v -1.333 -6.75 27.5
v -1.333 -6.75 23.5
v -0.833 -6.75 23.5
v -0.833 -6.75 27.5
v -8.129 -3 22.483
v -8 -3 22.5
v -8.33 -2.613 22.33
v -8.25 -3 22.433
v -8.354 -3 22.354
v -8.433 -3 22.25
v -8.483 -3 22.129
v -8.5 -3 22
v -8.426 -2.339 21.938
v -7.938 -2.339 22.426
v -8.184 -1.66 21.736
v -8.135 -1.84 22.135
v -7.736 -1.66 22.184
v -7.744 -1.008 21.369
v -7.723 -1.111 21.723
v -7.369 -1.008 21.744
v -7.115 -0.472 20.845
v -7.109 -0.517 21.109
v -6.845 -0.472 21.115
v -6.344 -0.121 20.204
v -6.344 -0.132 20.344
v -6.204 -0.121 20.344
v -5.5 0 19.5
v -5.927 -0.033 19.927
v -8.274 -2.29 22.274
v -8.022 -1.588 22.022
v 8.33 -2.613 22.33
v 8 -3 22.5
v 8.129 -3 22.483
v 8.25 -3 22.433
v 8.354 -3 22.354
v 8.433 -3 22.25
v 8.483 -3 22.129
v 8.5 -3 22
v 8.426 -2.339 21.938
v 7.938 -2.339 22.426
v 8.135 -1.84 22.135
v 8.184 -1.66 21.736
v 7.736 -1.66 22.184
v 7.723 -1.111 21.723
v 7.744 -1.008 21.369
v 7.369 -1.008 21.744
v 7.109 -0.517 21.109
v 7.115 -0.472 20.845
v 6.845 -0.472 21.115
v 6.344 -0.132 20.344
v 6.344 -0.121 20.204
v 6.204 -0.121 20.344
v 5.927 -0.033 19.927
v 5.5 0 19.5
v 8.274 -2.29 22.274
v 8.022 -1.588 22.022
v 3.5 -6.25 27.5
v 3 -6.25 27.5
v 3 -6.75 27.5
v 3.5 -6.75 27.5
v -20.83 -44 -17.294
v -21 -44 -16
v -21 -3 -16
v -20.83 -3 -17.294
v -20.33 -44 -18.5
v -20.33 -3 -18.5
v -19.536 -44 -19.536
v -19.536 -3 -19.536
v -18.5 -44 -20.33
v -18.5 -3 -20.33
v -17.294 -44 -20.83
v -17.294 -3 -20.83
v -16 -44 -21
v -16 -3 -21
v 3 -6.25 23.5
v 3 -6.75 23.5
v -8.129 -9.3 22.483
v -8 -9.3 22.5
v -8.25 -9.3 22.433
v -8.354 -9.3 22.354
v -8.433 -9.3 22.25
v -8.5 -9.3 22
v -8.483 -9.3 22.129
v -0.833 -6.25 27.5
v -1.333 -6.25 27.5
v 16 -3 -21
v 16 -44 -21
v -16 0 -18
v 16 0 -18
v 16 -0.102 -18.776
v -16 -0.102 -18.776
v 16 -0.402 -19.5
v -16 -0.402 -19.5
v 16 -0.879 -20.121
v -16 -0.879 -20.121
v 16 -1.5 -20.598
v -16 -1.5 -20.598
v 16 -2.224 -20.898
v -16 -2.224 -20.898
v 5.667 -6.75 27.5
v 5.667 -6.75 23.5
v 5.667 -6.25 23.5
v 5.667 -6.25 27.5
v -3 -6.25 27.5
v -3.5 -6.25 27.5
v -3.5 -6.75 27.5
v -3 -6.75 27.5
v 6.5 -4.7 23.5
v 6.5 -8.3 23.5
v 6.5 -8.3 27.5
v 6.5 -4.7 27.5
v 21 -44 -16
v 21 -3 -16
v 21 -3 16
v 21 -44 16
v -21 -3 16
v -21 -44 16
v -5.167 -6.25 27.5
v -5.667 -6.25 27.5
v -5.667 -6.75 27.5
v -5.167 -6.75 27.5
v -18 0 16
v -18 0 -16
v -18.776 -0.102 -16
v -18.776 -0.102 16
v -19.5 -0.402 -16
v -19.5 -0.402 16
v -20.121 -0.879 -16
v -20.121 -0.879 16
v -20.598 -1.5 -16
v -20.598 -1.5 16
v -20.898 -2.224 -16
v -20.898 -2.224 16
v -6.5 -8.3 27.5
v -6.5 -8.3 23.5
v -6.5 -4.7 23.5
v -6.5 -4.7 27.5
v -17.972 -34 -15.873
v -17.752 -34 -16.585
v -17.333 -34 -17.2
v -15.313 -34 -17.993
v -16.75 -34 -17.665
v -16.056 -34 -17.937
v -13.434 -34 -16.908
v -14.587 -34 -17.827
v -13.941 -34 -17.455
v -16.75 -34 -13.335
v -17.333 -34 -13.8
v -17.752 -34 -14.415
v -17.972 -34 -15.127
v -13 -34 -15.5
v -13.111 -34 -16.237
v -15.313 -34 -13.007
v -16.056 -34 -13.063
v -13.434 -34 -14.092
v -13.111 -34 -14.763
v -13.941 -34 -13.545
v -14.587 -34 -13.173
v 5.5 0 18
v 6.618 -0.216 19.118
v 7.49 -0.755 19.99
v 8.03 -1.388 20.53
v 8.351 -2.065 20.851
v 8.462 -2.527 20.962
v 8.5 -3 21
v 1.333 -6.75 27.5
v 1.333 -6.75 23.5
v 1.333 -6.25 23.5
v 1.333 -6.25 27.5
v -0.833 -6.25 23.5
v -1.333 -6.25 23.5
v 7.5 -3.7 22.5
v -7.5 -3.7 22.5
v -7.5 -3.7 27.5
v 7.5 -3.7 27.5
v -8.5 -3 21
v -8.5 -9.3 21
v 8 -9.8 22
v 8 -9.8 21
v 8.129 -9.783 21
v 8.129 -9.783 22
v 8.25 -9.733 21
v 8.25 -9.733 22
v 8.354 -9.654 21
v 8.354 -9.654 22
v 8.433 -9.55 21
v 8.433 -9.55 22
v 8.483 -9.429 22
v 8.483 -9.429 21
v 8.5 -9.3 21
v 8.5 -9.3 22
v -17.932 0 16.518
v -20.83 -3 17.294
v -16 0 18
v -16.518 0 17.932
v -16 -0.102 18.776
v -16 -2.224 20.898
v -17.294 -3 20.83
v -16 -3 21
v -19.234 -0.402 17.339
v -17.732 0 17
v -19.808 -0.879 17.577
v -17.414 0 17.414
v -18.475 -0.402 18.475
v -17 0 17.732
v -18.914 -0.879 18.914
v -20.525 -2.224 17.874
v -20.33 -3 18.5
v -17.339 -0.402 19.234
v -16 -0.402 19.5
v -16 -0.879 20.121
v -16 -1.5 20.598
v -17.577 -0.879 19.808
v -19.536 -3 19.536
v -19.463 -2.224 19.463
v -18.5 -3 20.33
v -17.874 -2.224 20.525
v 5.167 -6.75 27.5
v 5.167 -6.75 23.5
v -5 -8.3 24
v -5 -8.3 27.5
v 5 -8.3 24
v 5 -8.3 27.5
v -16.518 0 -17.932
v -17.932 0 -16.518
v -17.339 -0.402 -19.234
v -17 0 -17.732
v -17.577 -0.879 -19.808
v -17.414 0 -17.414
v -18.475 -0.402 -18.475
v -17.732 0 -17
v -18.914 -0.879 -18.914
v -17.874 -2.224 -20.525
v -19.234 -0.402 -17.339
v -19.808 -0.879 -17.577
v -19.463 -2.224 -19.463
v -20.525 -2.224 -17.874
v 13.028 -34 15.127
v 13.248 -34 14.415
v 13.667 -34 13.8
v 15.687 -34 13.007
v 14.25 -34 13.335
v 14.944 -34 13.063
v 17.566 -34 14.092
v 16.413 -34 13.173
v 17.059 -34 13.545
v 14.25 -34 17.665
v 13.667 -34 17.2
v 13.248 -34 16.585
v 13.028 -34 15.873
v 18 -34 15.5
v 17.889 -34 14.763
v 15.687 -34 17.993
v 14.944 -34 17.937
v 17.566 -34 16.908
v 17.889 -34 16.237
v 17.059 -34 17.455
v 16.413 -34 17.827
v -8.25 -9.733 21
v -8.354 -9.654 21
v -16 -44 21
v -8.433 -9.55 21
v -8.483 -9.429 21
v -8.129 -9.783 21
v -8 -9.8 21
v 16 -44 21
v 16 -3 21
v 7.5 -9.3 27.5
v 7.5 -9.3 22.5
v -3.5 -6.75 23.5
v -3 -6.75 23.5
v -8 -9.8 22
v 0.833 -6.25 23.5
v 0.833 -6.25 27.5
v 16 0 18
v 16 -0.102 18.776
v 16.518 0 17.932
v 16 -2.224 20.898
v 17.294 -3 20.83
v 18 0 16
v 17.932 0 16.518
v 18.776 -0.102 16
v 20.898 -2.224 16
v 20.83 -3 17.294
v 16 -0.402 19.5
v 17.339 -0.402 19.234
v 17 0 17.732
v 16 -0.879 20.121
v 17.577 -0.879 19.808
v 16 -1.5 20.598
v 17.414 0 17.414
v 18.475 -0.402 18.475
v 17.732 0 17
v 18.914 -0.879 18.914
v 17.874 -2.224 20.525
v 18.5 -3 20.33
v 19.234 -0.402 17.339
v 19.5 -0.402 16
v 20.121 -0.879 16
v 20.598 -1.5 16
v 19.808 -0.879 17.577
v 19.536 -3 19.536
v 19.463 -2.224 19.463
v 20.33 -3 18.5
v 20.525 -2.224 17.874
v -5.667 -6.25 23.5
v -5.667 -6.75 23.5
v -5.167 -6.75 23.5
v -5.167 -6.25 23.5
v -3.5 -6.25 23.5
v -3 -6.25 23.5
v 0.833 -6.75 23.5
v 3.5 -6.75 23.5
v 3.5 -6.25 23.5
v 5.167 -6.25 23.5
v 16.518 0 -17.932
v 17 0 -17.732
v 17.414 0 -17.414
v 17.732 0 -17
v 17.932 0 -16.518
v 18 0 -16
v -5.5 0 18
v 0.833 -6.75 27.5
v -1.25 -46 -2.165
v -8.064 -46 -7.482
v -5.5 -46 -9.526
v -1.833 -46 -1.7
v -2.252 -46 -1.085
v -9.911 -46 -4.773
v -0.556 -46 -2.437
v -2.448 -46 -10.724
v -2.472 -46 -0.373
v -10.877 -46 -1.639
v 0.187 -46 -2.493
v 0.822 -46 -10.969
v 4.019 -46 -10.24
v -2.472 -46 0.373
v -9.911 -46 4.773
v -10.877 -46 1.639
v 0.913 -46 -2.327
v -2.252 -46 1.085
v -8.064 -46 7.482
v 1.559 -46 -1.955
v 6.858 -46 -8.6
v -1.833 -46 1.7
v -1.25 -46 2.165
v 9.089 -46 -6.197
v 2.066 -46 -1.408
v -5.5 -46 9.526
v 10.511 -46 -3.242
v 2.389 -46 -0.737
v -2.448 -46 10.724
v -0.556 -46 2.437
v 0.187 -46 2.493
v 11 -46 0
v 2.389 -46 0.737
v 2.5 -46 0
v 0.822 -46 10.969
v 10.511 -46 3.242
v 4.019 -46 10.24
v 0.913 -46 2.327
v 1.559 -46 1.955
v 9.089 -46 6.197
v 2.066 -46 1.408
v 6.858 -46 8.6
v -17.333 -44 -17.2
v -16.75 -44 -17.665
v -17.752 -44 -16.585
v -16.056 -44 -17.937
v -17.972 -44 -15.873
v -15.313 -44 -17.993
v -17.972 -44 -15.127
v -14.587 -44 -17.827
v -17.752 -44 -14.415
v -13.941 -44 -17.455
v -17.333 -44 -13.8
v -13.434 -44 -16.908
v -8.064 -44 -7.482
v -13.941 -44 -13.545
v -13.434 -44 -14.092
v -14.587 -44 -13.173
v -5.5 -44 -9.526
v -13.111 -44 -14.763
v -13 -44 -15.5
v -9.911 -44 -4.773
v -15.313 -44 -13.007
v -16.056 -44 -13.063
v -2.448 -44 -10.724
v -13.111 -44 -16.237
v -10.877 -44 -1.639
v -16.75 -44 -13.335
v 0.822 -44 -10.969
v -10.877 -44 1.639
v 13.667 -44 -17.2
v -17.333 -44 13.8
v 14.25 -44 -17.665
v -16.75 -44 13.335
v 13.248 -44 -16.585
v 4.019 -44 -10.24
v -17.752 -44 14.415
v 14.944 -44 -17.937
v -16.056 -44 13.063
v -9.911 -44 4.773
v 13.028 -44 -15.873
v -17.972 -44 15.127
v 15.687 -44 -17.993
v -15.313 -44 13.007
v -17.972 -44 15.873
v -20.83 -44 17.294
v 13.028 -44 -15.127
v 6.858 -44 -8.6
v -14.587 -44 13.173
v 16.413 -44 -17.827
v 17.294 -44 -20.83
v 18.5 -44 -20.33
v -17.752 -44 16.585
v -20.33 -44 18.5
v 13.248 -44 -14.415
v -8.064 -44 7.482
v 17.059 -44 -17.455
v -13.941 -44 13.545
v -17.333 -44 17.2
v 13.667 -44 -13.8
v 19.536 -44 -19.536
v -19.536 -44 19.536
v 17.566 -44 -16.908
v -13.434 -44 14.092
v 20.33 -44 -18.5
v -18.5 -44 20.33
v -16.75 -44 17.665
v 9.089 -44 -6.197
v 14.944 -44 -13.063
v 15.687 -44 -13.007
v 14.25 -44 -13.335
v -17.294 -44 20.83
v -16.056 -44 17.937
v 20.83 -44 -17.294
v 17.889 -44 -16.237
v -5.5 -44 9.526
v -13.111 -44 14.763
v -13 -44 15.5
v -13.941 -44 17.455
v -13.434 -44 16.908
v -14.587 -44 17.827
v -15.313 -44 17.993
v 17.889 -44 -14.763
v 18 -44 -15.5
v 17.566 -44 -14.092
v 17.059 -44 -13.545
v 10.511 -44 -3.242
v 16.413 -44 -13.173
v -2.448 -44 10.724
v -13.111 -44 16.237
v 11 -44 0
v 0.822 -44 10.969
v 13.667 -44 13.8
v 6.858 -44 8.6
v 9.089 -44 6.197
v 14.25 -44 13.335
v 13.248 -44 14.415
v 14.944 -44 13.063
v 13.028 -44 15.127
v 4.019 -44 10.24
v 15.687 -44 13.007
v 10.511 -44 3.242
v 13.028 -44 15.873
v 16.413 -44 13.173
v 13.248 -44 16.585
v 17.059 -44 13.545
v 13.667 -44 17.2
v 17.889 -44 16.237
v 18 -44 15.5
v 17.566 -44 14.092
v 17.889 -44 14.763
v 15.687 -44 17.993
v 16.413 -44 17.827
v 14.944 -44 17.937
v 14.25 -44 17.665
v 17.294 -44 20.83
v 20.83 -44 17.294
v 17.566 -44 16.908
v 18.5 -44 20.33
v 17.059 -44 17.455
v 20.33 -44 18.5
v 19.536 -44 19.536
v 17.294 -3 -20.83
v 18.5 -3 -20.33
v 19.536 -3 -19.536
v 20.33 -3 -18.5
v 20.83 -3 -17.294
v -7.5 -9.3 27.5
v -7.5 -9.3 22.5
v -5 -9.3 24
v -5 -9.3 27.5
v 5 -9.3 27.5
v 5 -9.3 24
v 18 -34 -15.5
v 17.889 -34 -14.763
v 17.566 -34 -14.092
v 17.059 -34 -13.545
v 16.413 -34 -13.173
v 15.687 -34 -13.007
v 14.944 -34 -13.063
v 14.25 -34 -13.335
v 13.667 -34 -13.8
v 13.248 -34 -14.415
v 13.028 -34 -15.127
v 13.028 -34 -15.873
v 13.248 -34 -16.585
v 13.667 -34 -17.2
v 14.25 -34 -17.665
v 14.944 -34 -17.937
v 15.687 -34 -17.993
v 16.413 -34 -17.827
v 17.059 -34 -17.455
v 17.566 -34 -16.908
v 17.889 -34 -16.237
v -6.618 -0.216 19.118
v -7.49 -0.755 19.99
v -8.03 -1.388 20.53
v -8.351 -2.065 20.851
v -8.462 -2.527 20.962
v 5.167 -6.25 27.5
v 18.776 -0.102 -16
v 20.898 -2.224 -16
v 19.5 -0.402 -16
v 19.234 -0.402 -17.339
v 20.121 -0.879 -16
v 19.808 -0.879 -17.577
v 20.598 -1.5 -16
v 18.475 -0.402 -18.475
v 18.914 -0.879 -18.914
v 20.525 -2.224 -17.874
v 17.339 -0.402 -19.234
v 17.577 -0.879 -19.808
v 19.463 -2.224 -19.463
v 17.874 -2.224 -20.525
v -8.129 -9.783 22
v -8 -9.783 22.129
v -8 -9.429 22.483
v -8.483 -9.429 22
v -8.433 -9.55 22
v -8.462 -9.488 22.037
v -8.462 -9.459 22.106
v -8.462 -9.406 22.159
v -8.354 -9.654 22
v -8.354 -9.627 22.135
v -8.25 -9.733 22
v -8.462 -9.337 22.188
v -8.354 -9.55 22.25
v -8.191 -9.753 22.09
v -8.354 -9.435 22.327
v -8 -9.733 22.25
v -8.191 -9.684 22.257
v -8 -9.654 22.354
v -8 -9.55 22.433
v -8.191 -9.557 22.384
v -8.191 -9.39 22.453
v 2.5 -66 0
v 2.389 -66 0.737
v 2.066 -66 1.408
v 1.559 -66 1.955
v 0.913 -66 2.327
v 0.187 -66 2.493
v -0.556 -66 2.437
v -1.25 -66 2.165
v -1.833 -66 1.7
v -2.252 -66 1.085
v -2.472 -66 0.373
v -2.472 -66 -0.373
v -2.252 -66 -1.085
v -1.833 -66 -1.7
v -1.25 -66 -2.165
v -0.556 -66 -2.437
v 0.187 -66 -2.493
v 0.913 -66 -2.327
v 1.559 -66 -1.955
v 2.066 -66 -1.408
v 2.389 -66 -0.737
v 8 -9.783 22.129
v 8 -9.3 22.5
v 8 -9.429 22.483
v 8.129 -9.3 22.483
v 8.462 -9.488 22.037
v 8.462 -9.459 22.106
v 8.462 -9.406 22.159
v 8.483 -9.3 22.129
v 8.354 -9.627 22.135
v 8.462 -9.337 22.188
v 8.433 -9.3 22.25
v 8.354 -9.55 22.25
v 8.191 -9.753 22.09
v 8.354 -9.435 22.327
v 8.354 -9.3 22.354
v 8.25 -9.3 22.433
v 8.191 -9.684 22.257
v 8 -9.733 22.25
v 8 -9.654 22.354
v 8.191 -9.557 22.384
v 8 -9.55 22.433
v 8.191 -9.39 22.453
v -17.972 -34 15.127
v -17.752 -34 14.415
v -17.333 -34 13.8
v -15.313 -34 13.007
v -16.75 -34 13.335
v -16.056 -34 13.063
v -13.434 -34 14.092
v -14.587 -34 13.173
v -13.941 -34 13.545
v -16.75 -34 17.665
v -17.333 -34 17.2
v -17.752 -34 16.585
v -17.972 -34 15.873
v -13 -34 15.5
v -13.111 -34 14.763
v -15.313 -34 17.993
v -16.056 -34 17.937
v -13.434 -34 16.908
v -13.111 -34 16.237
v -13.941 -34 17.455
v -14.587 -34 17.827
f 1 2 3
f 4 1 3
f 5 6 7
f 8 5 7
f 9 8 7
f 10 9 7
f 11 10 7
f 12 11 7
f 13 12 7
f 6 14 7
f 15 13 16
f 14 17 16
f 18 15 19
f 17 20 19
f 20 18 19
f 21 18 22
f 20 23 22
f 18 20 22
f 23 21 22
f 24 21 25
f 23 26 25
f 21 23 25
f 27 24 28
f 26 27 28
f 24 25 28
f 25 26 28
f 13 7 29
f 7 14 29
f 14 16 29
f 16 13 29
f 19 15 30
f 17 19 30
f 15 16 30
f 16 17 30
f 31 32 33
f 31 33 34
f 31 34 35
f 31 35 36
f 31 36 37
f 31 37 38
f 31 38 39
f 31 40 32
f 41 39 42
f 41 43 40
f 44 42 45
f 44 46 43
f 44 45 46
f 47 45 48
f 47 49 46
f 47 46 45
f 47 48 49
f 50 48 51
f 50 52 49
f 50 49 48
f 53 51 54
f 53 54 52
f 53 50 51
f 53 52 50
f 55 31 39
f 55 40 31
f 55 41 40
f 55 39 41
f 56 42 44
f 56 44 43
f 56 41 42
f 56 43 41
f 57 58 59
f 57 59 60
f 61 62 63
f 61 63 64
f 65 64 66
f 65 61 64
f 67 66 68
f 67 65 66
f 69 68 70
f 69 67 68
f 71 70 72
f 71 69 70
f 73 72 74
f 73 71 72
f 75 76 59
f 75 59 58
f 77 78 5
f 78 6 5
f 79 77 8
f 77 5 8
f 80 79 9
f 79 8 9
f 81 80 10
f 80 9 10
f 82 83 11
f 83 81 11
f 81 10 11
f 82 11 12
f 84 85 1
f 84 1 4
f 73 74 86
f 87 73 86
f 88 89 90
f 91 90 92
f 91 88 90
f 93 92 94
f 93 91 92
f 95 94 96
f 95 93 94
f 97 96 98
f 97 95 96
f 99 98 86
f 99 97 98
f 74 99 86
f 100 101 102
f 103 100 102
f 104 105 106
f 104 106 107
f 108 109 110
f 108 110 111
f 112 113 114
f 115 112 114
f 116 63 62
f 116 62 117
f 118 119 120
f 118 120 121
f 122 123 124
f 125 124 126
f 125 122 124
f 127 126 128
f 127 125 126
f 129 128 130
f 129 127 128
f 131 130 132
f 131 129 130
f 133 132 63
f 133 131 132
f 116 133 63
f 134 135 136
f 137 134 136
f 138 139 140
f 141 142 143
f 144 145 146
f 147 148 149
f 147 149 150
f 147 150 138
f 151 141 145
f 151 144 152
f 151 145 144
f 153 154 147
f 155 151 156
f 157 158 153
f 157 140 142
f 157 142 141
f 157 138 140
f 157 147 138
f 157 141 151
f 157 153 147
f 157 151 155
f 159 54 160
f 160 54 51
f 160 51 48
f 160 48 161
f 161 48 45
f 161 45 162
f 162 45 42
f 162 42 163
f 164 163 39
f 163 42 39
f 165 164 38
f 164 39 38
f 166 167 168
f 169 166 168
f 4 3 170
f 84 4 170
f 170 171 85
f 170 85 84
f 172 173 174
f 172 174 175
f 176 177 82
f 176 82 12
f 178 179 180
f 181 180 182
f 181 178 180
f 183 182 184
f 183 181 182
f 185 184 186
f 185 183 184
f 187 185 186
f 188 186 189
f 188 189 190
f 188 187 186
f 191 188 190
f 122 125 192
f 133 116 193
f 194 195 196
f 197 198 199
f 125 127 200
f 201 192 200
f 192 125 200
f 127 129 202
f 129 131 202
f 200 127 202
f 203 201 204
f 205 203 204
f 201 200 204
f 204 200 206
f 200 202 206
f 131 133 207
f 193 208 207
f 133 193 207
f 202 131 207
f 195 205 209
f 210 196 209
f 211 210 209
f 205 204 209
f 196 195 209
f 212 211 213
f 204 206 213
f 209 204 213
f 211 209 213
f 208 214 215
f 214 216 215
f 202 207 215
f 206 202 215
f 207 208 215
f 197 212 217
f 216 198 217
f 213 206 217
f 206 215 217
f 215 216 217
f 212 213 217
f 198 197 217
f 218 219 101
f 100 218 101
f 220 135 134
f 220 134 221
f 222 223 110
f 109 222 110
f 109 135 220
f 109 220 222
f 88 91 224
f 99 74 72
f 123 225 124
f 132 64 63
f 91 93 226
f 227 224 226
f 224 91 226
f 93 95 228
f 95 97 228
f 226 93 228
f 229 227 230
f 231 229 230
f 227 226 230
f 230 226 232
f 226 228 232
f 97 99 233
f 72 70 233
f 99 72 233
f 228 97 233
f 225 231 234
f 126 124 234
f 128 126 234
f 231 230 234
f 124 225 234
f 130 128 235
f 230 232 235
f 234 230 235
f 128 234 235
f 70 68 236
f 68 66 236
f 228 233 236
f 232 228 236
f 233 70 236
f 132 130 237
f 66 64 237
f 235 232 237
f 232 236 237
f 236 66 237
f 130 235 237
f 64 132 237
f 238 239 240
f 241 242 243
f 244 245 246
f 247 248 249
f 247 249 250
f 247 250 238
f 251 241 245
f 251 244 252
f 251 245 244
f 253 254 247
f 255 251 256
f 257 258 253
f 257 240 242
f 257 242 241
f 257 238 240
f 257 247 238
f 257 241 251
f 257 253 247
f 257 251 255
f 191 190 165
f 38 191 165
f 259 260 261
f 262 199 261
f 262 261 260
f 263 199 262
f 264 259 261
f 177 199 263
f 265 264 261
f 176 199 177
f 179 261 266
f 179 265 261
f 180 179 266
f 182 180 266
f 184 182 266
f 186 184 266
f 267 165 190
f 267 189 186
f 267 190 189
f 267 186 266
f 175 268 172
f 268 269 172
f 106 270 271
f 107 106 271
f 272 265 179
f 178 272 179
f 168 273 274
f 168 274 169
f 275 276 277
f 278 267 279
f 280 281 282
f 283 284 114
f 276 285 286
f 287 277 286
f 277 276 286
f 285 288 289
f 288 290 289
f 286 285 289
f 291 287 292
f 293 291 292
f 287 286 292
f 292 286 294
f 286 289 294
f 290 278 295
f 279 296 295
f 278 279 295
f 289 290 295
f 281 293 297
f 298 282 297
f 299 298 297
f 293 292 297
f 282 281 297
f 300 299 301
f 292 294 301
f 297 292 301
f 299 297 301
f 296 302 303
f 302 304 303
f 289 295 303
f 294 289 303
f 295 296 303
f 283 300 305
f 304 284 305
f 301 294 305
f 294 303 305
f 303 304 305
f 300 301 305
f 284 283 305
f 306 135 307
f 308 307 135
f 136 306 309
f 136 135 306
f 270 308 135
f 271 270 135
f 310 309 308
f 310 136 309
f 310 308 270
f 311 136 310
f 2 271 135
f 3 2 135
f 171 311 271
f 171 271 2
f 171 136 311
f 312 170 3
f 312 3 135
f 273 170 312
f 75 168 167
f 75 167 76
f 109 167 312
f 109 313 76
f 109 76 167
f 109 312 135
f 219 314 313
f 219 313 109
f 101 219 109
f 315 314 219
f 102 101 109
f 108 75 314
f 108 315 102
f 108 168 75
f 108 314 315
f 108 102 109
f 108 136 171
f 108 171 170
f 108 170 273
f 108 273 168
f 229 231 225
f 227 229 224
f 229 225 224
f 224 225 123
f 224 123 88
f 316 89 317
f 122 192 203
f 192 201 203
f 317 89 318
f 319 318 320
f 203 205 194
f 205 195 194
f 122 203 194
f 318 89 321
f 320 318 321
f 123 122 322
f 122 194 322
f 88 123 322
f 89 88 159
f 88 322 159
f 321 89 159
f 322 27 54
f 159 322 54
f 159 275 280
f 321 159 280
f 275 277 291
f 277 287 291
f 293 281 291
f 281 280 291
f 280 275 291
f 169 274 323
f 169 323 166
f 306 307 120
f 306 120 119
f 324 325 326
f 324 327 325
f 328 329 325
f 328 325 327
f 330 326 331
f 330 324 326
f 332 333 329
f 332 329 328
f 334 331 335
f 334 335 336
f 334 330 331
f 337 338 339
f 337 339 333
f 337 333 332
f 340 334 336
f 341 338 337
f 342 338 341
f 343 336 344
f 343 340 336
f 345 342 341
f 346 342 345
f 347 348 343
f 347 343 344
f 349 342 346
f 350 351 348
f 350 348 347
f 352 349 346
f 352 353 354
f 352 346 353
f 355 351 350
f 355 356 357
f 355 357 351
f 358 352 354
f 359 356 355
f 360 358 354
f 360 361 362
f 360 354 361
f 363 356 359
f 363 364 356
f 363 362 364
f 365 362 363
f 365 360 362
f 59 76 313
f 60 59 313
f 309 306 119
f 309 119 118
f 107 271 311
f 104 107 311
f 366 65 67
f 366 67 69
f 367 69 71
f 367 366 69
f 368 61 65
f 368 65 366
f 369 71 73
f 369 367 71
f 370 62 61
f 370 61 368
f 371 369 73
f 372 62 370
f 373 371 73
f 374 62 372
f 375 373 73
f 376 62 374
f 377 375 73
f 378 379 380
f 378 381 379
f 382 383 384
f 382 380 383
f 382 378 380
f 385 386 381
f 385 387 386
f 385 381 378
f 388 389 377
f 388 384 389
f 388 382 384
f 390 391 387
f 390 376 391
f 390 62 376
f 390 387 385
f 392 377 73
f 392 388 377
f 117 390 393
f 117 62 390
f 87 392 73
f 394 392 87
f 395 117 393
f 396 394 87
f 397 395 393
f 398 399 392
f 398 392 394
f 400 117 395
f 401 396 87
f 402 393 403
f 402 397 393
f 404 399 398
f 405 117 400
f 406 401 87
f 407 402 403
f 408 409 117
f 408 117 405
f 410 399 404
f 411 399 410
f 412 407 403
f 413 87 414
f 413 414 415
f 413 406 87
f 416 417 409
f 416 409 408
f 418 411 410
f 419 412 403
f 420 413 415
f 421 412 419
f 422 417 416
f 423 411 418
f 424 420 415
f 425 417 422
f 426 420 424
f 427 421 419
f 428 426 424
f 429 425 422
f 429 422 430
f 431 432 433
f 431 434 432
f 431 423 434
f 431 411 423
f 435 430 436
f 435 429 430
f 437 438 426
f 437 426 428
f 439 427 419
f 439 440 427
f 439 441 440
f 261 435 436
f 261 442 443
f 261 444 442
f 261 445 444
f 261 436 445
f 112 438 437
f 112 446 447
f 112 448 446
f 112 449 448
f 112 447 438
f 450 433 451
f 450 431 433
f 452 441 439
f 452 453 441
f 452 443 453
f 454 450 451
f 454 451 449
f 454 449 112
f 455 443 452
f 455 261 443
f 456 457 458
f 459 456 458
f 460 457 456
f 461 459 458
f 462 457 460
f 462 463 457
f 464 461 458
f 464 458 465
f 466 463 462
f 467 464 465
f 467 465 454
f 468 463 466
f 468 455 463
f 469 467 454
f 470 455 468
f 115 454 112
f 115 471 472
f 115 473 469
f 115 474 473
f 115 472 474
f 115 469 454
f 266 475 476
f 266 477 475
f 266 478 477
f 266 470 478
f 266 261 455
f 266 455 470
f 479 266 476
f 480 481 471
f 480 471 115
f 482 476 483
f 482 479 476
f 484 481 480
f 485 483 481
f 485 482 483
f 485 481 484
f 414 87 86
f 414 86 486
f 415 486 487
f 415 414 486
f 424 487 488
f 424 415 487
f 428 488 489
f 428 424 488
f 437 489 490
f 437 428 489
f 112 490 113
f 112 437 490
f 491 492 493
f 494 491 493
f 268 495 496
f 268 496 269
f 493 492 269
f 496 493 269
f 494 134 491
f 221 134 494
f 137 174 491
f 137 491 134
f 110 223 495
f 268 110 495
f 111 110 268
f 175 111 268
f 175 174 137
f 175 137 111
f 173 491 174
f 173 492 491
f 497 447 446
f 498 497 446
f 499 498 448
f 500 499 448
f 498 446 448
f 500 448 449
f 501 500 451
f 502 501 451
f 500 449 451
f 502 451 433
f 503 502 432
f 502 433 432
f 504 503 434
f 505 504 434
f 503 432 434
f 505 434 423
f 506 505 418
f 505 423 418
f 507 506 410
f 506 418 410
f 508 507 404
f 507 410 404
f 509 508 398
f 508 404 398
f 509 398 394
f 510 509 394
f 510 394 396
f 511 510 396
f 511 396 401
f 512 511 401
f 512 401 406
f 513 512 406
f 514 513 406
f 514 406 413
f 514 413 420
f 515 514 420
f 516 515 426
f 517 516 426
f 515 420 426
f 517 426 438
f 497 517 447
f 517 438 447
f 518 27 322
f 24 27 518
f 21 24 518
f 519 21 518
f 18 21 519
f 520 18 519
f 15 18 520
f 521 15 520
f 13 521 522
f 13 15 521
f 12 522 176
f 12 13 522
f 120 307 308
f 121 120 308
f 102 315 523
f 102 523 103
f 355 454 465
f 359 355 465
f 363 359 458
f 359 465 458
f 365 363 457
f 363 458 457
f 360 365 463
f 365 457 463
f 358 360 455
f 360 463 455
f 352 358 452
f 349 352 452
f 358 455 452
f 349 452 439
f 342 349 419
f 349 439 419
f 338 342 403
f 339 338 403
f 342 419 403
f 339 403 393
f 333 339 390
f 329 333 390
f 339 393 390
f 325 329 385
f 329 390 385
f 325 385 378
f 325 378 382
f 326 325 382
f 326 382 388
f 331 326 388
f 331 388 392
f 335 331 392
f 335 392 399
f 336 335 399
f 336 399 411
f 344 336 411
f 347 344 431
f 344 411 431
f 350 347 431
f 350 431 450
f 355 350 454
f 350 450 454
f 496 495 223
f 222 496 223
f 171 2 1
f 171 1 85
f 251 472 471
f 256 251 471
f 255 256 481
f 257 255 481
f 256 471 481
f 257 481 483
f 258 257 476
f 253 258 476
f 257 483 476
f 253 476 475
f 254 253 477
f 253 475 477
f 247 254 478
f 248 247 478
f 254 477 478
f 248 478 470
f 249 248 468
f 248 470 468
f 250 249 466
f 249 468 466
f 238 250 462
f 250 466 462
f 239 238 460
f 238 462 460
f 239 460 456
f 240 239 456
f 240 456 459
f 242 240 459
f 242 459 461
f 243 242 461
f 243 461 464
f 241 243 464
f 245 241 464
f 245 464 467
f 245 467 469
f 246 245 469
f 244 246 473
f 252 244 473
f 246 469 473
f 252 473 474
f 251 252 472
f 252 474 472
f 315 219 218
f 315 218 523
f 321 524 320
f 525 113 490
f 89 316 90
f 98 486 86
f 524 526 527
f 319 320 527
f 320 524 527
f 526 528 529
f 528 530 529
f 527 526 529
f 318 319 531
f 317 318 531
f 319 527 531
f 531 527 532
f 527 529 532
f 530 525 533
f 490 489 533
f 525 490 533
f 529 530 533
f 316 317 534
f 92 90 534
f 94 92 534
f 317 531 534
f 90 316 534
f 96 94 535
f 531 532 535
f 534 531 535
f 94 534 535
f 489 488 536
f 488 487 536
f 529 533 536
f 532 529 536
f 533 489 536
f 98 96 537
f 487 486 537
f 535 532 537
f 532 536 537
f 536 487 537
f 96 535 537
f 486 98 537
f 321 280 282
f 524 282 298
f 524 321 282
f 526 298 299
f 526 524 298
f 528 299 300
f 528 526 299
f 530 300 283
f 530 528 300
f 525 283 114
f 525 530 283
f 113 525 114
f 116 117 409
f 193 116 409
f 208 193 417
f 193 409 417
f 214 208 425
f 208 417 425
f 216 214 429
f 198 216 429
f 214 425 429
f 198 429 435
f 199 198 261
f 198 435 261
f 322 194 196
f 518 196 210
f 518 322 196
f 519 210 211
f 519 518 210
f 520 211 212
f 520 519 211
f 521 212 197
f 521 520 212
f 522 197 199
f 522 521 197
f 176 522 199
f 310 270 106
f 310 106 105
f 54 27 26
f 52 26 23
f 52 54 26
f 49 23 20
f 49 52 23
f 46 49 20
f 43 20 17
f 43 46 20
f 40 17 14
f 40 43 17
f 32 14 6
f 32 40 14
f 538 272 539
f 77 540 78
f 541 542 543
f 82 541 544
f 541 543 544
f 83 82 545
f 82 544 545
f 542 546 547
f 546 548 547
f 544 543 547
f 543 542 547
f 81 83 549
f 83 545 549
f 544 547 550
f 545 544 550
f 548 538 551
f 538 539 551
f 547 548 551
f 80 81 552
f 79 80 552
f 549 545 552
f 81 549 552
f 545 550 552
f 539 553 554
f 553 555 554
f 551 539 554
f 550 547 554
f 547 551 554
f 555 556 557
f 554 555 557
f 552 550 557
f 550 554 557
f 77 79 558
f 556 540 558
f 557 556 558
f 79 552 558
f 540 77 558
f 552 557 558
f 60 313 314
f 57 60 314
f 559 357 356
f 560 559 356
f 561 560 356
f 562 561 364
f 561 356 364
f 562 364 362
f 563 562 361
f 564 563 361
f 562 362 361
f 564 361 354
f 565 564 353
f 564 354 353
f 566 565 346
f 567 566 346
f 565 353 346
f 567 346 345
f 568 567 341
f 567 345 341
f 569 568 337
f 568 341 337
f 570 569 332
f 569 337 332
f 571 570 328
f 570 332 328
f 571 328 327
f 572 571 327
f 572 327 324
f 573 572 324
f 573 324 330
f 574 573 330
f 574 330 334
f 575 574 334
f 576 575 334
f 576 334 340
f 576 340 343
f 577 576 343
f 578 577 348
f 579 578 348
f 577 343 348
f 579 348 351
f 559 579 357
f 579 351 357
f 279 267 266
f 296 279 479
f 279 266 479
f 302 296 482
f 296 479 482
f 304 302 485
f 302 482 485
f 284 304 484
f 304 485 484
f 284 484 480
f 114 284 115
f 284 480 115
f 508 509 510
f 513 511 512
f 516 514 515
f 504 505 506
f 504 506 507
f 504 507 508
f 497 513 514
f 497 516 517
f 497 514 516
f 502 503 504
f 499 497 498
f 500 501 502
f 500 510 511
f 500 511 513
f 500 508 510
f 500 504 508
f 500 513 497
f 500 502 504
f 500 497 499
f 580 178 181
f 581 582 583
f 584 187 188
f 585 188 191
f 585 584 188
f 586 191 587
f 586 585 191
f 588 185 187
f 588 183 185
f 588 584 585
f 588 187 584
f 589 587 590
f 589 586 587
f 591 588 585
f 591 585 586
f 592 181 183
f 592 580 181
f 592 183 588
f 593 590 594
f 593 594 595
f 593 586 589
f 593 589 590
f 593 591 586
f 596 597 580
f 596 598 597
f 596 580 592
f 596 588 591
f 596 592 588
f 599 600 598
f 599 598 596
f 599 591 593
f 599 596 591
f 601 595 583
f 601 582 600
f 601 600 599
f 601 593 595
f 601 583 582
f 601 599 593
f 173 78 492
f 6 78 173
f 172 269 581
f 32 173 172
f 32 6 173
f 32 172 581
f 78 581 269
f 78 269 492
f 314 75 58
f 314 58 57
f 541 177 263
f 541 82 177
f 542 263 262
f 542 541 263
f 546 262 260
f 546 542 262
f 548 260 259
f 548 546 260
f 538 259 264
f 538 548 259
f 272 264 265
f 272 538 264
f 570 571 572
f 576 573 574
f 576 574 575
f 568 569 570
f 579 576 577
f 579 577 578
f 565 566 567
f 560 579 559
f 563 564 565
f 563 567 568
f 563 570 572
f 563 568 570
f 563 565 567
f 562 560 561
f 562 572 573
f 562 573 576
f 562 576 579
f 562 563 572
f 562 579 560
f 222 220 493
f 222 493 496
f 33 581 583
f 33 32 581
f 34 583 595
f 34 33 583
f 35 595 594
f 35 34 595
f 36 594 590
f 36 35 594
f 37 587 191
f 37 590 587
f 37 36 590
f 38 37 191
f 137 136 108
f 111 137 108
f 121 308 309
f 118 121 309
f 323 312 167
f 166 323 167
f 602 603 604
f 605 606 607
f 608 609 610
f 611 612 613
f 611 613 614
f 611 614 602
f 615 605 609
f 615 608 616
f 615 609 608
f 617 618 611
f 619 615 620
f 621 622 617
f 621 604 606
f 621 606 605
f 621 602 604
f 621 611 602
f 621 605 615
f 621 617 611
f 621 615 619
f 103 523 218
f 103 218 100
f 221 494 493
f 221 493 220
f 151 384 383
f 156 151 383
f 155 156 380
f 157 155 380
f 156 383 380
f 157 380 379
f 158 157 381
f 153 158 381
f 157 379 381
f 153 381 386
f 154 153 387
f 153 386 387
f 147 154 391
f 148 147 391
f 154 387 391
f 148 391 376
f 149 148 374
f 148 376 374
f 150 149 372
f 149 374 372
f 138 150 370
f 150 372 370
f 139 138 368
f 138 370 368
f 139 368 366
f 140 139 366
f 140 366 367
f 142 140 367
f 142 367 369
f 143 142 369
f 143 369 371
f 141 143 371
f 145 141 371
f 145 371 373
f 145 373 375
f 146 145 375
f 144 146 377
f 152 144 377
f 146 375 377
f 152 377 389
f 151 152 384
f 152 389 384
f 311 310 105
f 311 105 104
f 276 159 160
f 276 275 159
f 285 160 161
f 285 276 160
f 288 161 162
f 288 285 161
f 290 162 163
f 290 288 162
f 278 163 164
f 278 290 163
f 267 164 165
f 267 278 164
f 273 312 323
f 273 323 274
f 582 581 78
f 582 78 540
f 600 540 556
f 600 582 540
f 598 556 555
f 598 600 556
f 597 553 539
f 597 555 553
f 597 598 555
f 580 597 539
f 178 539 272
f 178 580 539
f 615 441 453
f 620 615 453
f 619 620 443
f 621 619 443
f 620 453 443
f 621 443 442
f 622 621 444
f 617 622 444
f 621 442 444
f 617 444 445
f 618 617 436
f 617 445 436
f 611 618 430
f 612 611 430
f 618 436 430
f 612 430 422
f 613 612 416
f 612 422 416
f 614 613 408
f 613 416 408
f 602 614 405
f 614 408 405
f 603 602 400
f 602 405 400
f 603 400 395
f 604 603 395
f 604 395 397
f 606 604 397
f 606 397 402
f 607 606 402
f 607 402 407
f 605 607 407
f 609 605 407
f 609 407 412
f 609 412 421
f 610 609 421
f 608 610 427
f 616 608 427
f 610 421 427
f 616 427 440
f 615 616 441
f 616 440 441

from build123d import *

# Parameters (mm, degrees)
F0_W      = 42
F0_H      = 42
F1_DEPTH  = 44
F2_R      = 11
F3_DEPTH  = 2
F4_R      = 2.5
F5_DEPTH  = 20
F6_R      = 2.5
F7_DEPTH  = 10
F8_W      = 17
F8_H      = 9.8
F9_DEPTH  = 1.5
F10_R     = 5
F11_R     = 3
F12_W     = 15
F12_H     = 5.6
F13_DEPTH = 1
F14_W     = 15
F14_H     = 5.6
F14_W_2   = 13
F14_H_2   = 3.6
F15_DEPTH = 4
F16_W     = 0.5
F16_H     = 0.5
F17_DEPTH = 4
F18_R     = 0.49999
F19_W     = 10
F19_H     = 1
F20_DEPTH = 3.5


# Not quite as in the source:
# - a fillet or chamfer is up to 0.001 mm smaller than in the source, because OpenCascade refuses the exact size


with BuildPart() as f1:
    # F0 (on Front) → F1 (new body)
    with BuildSketch(Plane.XZ):
        Rectangle(F0_W, F0_H)
    extrude(amount=F1_DEPTH)

    # F2 (on face) → F3 (join)
    with BuildSketch(Plane.XZ.offset(44)):
        Circle(F2_R)
    extrude(amount=F3_DEPTH)

    # F4 (on face) → F5 (join)
    with BuildSketch(Plane.XZ.offset(46)):
        Circle(F4_R)
    extrude(amount=F5_DEPTH)

    # F6 (on face) → F7 (cut)
    with BuildSketch(Plane.XZ.offset(44)):
        with Locations((-15.5, 15.5)):
            Circle(F6_R)
        with Locations((15.5, 15.5)):
            Circle(F6_R)
        with Locations((15.5, -15.5)):
            Circle(F6_R)
        with Locations((-15.5, -15.5)):
            Circle(F6_R)
    extrude(amount=-F7_DEPTH, mode=Mode.SUBTRACT)

    # F8 (on face) → F9 (join)
    with BuildSketch(Plane.XY.offset(21)):
        with Locations((0, -4.9)):
            Rectangle(F8_W, F8_H)
    extrude(amount=F9_DEPTH)

    # F10
    f10_edges = [f1.edges().sort_by_distance(p)[0] for p in [
        (-21, -22, 21),
        (21, -22, 21),
        (21, -22, -21),
        (-21, -22, -21),
    ]]
    fillet(f10_edges, radius=F10_R)

    # F11
    f11_edges = [f1.edges().sort_by_distance(p)[0] for p in [
        (12.25, 0, 21),
        (19.535534, 0, 19.535534),
        (8.5, 0, 21.75),
        (21, 0, 0),
        (0, 0, 22.5),
        (19.535534, 0, -19.535534),
        (-8.5, 0, 21.75),
        (0, 0, -21),
        (-12.25, 0, 21),
        (-19.535534, 0, -19.535534),
        (-19.535534, 0, 19.535534),
        (-21, 0, 0),
    ]]
    fillet(f11_edges, radius=F11_R)

    # F12 (on face) → F13 (join)
    with BuildSketch(Plane.XY.offset(22.5)):
        with Locations((0, -6.5)):
            Rectangle(F12_W, F12_H)
    extrude(amount=F13_DEPTH)

    # F14 (on face) → F15 (join)
    with BuildSketch(Plane.XY.offset(23.5)):
        with Locations((0, -6.5)):
            Rectangle(F14_W, F14_H)
        with Locations((0, -6.5)):
            Rectangle(F14_W_2, F14_H_2, mode=Mode.SUBTRACT)
    extrude(amount=F15_DEPTH)

    # F16 (on face) → F17 (join)
    with BuildSketch(Plane.XY.offset(23.5)):
        with Locations((-5.417, -6.5)):
            Rectangle(F16_W, F16_H)
        with Locations((-3.25, -6.5)):
            Rectangle(F16_W, F16_H)
        with Locations((-1.083, -6.5)):
            Rectangle(F16_W, F16_H)
        with Locations((3.25, -6.5)):
            Rectangle(F16_W, F16_H)
        with Locations((1.083, -6.5)):
            Rectangle(F16_W, F16_H)
        with Locations((5.417, -6.5)):
            Rectangle(F16_W, F16_H)
    extrude(amount=F17_DEPTH)

    # F18 (radius 0.5 in the source; OpenCascade refuses exactly that, so slightly less here)
    f18_edges = [f1.edges().sort_by_distance(p)[0] for p in [
        (0, -9.8, 22.5),
        (8.5, -9.8, 21.75),
        (8.5, -6.4, 22.5),
        (-8.5, -9.8, 21.75),
        (-8.5, -6.4, 22.5),
        (-7.438147, -0.710112, 21.438147),
        (7.438147, -0.710112, 21.438147),
        (0, 0, 19.5),
        (5.5, 0, 18.75),
        (-5.5, 0, 18.75),
    ]]
    fillet(f18_edges, radius=F18_R)

    # F19 (on face) → F20 (cut)
    with BuildSketch(Plane.XY.offset(27.5)):
        with Locations((0, -8.8)):
            Rectangle(F19_W, F19_H)
    extrude(amount=-F20_DEPTH, mode=Mode.SUBTRACT)


solid = f1.part
